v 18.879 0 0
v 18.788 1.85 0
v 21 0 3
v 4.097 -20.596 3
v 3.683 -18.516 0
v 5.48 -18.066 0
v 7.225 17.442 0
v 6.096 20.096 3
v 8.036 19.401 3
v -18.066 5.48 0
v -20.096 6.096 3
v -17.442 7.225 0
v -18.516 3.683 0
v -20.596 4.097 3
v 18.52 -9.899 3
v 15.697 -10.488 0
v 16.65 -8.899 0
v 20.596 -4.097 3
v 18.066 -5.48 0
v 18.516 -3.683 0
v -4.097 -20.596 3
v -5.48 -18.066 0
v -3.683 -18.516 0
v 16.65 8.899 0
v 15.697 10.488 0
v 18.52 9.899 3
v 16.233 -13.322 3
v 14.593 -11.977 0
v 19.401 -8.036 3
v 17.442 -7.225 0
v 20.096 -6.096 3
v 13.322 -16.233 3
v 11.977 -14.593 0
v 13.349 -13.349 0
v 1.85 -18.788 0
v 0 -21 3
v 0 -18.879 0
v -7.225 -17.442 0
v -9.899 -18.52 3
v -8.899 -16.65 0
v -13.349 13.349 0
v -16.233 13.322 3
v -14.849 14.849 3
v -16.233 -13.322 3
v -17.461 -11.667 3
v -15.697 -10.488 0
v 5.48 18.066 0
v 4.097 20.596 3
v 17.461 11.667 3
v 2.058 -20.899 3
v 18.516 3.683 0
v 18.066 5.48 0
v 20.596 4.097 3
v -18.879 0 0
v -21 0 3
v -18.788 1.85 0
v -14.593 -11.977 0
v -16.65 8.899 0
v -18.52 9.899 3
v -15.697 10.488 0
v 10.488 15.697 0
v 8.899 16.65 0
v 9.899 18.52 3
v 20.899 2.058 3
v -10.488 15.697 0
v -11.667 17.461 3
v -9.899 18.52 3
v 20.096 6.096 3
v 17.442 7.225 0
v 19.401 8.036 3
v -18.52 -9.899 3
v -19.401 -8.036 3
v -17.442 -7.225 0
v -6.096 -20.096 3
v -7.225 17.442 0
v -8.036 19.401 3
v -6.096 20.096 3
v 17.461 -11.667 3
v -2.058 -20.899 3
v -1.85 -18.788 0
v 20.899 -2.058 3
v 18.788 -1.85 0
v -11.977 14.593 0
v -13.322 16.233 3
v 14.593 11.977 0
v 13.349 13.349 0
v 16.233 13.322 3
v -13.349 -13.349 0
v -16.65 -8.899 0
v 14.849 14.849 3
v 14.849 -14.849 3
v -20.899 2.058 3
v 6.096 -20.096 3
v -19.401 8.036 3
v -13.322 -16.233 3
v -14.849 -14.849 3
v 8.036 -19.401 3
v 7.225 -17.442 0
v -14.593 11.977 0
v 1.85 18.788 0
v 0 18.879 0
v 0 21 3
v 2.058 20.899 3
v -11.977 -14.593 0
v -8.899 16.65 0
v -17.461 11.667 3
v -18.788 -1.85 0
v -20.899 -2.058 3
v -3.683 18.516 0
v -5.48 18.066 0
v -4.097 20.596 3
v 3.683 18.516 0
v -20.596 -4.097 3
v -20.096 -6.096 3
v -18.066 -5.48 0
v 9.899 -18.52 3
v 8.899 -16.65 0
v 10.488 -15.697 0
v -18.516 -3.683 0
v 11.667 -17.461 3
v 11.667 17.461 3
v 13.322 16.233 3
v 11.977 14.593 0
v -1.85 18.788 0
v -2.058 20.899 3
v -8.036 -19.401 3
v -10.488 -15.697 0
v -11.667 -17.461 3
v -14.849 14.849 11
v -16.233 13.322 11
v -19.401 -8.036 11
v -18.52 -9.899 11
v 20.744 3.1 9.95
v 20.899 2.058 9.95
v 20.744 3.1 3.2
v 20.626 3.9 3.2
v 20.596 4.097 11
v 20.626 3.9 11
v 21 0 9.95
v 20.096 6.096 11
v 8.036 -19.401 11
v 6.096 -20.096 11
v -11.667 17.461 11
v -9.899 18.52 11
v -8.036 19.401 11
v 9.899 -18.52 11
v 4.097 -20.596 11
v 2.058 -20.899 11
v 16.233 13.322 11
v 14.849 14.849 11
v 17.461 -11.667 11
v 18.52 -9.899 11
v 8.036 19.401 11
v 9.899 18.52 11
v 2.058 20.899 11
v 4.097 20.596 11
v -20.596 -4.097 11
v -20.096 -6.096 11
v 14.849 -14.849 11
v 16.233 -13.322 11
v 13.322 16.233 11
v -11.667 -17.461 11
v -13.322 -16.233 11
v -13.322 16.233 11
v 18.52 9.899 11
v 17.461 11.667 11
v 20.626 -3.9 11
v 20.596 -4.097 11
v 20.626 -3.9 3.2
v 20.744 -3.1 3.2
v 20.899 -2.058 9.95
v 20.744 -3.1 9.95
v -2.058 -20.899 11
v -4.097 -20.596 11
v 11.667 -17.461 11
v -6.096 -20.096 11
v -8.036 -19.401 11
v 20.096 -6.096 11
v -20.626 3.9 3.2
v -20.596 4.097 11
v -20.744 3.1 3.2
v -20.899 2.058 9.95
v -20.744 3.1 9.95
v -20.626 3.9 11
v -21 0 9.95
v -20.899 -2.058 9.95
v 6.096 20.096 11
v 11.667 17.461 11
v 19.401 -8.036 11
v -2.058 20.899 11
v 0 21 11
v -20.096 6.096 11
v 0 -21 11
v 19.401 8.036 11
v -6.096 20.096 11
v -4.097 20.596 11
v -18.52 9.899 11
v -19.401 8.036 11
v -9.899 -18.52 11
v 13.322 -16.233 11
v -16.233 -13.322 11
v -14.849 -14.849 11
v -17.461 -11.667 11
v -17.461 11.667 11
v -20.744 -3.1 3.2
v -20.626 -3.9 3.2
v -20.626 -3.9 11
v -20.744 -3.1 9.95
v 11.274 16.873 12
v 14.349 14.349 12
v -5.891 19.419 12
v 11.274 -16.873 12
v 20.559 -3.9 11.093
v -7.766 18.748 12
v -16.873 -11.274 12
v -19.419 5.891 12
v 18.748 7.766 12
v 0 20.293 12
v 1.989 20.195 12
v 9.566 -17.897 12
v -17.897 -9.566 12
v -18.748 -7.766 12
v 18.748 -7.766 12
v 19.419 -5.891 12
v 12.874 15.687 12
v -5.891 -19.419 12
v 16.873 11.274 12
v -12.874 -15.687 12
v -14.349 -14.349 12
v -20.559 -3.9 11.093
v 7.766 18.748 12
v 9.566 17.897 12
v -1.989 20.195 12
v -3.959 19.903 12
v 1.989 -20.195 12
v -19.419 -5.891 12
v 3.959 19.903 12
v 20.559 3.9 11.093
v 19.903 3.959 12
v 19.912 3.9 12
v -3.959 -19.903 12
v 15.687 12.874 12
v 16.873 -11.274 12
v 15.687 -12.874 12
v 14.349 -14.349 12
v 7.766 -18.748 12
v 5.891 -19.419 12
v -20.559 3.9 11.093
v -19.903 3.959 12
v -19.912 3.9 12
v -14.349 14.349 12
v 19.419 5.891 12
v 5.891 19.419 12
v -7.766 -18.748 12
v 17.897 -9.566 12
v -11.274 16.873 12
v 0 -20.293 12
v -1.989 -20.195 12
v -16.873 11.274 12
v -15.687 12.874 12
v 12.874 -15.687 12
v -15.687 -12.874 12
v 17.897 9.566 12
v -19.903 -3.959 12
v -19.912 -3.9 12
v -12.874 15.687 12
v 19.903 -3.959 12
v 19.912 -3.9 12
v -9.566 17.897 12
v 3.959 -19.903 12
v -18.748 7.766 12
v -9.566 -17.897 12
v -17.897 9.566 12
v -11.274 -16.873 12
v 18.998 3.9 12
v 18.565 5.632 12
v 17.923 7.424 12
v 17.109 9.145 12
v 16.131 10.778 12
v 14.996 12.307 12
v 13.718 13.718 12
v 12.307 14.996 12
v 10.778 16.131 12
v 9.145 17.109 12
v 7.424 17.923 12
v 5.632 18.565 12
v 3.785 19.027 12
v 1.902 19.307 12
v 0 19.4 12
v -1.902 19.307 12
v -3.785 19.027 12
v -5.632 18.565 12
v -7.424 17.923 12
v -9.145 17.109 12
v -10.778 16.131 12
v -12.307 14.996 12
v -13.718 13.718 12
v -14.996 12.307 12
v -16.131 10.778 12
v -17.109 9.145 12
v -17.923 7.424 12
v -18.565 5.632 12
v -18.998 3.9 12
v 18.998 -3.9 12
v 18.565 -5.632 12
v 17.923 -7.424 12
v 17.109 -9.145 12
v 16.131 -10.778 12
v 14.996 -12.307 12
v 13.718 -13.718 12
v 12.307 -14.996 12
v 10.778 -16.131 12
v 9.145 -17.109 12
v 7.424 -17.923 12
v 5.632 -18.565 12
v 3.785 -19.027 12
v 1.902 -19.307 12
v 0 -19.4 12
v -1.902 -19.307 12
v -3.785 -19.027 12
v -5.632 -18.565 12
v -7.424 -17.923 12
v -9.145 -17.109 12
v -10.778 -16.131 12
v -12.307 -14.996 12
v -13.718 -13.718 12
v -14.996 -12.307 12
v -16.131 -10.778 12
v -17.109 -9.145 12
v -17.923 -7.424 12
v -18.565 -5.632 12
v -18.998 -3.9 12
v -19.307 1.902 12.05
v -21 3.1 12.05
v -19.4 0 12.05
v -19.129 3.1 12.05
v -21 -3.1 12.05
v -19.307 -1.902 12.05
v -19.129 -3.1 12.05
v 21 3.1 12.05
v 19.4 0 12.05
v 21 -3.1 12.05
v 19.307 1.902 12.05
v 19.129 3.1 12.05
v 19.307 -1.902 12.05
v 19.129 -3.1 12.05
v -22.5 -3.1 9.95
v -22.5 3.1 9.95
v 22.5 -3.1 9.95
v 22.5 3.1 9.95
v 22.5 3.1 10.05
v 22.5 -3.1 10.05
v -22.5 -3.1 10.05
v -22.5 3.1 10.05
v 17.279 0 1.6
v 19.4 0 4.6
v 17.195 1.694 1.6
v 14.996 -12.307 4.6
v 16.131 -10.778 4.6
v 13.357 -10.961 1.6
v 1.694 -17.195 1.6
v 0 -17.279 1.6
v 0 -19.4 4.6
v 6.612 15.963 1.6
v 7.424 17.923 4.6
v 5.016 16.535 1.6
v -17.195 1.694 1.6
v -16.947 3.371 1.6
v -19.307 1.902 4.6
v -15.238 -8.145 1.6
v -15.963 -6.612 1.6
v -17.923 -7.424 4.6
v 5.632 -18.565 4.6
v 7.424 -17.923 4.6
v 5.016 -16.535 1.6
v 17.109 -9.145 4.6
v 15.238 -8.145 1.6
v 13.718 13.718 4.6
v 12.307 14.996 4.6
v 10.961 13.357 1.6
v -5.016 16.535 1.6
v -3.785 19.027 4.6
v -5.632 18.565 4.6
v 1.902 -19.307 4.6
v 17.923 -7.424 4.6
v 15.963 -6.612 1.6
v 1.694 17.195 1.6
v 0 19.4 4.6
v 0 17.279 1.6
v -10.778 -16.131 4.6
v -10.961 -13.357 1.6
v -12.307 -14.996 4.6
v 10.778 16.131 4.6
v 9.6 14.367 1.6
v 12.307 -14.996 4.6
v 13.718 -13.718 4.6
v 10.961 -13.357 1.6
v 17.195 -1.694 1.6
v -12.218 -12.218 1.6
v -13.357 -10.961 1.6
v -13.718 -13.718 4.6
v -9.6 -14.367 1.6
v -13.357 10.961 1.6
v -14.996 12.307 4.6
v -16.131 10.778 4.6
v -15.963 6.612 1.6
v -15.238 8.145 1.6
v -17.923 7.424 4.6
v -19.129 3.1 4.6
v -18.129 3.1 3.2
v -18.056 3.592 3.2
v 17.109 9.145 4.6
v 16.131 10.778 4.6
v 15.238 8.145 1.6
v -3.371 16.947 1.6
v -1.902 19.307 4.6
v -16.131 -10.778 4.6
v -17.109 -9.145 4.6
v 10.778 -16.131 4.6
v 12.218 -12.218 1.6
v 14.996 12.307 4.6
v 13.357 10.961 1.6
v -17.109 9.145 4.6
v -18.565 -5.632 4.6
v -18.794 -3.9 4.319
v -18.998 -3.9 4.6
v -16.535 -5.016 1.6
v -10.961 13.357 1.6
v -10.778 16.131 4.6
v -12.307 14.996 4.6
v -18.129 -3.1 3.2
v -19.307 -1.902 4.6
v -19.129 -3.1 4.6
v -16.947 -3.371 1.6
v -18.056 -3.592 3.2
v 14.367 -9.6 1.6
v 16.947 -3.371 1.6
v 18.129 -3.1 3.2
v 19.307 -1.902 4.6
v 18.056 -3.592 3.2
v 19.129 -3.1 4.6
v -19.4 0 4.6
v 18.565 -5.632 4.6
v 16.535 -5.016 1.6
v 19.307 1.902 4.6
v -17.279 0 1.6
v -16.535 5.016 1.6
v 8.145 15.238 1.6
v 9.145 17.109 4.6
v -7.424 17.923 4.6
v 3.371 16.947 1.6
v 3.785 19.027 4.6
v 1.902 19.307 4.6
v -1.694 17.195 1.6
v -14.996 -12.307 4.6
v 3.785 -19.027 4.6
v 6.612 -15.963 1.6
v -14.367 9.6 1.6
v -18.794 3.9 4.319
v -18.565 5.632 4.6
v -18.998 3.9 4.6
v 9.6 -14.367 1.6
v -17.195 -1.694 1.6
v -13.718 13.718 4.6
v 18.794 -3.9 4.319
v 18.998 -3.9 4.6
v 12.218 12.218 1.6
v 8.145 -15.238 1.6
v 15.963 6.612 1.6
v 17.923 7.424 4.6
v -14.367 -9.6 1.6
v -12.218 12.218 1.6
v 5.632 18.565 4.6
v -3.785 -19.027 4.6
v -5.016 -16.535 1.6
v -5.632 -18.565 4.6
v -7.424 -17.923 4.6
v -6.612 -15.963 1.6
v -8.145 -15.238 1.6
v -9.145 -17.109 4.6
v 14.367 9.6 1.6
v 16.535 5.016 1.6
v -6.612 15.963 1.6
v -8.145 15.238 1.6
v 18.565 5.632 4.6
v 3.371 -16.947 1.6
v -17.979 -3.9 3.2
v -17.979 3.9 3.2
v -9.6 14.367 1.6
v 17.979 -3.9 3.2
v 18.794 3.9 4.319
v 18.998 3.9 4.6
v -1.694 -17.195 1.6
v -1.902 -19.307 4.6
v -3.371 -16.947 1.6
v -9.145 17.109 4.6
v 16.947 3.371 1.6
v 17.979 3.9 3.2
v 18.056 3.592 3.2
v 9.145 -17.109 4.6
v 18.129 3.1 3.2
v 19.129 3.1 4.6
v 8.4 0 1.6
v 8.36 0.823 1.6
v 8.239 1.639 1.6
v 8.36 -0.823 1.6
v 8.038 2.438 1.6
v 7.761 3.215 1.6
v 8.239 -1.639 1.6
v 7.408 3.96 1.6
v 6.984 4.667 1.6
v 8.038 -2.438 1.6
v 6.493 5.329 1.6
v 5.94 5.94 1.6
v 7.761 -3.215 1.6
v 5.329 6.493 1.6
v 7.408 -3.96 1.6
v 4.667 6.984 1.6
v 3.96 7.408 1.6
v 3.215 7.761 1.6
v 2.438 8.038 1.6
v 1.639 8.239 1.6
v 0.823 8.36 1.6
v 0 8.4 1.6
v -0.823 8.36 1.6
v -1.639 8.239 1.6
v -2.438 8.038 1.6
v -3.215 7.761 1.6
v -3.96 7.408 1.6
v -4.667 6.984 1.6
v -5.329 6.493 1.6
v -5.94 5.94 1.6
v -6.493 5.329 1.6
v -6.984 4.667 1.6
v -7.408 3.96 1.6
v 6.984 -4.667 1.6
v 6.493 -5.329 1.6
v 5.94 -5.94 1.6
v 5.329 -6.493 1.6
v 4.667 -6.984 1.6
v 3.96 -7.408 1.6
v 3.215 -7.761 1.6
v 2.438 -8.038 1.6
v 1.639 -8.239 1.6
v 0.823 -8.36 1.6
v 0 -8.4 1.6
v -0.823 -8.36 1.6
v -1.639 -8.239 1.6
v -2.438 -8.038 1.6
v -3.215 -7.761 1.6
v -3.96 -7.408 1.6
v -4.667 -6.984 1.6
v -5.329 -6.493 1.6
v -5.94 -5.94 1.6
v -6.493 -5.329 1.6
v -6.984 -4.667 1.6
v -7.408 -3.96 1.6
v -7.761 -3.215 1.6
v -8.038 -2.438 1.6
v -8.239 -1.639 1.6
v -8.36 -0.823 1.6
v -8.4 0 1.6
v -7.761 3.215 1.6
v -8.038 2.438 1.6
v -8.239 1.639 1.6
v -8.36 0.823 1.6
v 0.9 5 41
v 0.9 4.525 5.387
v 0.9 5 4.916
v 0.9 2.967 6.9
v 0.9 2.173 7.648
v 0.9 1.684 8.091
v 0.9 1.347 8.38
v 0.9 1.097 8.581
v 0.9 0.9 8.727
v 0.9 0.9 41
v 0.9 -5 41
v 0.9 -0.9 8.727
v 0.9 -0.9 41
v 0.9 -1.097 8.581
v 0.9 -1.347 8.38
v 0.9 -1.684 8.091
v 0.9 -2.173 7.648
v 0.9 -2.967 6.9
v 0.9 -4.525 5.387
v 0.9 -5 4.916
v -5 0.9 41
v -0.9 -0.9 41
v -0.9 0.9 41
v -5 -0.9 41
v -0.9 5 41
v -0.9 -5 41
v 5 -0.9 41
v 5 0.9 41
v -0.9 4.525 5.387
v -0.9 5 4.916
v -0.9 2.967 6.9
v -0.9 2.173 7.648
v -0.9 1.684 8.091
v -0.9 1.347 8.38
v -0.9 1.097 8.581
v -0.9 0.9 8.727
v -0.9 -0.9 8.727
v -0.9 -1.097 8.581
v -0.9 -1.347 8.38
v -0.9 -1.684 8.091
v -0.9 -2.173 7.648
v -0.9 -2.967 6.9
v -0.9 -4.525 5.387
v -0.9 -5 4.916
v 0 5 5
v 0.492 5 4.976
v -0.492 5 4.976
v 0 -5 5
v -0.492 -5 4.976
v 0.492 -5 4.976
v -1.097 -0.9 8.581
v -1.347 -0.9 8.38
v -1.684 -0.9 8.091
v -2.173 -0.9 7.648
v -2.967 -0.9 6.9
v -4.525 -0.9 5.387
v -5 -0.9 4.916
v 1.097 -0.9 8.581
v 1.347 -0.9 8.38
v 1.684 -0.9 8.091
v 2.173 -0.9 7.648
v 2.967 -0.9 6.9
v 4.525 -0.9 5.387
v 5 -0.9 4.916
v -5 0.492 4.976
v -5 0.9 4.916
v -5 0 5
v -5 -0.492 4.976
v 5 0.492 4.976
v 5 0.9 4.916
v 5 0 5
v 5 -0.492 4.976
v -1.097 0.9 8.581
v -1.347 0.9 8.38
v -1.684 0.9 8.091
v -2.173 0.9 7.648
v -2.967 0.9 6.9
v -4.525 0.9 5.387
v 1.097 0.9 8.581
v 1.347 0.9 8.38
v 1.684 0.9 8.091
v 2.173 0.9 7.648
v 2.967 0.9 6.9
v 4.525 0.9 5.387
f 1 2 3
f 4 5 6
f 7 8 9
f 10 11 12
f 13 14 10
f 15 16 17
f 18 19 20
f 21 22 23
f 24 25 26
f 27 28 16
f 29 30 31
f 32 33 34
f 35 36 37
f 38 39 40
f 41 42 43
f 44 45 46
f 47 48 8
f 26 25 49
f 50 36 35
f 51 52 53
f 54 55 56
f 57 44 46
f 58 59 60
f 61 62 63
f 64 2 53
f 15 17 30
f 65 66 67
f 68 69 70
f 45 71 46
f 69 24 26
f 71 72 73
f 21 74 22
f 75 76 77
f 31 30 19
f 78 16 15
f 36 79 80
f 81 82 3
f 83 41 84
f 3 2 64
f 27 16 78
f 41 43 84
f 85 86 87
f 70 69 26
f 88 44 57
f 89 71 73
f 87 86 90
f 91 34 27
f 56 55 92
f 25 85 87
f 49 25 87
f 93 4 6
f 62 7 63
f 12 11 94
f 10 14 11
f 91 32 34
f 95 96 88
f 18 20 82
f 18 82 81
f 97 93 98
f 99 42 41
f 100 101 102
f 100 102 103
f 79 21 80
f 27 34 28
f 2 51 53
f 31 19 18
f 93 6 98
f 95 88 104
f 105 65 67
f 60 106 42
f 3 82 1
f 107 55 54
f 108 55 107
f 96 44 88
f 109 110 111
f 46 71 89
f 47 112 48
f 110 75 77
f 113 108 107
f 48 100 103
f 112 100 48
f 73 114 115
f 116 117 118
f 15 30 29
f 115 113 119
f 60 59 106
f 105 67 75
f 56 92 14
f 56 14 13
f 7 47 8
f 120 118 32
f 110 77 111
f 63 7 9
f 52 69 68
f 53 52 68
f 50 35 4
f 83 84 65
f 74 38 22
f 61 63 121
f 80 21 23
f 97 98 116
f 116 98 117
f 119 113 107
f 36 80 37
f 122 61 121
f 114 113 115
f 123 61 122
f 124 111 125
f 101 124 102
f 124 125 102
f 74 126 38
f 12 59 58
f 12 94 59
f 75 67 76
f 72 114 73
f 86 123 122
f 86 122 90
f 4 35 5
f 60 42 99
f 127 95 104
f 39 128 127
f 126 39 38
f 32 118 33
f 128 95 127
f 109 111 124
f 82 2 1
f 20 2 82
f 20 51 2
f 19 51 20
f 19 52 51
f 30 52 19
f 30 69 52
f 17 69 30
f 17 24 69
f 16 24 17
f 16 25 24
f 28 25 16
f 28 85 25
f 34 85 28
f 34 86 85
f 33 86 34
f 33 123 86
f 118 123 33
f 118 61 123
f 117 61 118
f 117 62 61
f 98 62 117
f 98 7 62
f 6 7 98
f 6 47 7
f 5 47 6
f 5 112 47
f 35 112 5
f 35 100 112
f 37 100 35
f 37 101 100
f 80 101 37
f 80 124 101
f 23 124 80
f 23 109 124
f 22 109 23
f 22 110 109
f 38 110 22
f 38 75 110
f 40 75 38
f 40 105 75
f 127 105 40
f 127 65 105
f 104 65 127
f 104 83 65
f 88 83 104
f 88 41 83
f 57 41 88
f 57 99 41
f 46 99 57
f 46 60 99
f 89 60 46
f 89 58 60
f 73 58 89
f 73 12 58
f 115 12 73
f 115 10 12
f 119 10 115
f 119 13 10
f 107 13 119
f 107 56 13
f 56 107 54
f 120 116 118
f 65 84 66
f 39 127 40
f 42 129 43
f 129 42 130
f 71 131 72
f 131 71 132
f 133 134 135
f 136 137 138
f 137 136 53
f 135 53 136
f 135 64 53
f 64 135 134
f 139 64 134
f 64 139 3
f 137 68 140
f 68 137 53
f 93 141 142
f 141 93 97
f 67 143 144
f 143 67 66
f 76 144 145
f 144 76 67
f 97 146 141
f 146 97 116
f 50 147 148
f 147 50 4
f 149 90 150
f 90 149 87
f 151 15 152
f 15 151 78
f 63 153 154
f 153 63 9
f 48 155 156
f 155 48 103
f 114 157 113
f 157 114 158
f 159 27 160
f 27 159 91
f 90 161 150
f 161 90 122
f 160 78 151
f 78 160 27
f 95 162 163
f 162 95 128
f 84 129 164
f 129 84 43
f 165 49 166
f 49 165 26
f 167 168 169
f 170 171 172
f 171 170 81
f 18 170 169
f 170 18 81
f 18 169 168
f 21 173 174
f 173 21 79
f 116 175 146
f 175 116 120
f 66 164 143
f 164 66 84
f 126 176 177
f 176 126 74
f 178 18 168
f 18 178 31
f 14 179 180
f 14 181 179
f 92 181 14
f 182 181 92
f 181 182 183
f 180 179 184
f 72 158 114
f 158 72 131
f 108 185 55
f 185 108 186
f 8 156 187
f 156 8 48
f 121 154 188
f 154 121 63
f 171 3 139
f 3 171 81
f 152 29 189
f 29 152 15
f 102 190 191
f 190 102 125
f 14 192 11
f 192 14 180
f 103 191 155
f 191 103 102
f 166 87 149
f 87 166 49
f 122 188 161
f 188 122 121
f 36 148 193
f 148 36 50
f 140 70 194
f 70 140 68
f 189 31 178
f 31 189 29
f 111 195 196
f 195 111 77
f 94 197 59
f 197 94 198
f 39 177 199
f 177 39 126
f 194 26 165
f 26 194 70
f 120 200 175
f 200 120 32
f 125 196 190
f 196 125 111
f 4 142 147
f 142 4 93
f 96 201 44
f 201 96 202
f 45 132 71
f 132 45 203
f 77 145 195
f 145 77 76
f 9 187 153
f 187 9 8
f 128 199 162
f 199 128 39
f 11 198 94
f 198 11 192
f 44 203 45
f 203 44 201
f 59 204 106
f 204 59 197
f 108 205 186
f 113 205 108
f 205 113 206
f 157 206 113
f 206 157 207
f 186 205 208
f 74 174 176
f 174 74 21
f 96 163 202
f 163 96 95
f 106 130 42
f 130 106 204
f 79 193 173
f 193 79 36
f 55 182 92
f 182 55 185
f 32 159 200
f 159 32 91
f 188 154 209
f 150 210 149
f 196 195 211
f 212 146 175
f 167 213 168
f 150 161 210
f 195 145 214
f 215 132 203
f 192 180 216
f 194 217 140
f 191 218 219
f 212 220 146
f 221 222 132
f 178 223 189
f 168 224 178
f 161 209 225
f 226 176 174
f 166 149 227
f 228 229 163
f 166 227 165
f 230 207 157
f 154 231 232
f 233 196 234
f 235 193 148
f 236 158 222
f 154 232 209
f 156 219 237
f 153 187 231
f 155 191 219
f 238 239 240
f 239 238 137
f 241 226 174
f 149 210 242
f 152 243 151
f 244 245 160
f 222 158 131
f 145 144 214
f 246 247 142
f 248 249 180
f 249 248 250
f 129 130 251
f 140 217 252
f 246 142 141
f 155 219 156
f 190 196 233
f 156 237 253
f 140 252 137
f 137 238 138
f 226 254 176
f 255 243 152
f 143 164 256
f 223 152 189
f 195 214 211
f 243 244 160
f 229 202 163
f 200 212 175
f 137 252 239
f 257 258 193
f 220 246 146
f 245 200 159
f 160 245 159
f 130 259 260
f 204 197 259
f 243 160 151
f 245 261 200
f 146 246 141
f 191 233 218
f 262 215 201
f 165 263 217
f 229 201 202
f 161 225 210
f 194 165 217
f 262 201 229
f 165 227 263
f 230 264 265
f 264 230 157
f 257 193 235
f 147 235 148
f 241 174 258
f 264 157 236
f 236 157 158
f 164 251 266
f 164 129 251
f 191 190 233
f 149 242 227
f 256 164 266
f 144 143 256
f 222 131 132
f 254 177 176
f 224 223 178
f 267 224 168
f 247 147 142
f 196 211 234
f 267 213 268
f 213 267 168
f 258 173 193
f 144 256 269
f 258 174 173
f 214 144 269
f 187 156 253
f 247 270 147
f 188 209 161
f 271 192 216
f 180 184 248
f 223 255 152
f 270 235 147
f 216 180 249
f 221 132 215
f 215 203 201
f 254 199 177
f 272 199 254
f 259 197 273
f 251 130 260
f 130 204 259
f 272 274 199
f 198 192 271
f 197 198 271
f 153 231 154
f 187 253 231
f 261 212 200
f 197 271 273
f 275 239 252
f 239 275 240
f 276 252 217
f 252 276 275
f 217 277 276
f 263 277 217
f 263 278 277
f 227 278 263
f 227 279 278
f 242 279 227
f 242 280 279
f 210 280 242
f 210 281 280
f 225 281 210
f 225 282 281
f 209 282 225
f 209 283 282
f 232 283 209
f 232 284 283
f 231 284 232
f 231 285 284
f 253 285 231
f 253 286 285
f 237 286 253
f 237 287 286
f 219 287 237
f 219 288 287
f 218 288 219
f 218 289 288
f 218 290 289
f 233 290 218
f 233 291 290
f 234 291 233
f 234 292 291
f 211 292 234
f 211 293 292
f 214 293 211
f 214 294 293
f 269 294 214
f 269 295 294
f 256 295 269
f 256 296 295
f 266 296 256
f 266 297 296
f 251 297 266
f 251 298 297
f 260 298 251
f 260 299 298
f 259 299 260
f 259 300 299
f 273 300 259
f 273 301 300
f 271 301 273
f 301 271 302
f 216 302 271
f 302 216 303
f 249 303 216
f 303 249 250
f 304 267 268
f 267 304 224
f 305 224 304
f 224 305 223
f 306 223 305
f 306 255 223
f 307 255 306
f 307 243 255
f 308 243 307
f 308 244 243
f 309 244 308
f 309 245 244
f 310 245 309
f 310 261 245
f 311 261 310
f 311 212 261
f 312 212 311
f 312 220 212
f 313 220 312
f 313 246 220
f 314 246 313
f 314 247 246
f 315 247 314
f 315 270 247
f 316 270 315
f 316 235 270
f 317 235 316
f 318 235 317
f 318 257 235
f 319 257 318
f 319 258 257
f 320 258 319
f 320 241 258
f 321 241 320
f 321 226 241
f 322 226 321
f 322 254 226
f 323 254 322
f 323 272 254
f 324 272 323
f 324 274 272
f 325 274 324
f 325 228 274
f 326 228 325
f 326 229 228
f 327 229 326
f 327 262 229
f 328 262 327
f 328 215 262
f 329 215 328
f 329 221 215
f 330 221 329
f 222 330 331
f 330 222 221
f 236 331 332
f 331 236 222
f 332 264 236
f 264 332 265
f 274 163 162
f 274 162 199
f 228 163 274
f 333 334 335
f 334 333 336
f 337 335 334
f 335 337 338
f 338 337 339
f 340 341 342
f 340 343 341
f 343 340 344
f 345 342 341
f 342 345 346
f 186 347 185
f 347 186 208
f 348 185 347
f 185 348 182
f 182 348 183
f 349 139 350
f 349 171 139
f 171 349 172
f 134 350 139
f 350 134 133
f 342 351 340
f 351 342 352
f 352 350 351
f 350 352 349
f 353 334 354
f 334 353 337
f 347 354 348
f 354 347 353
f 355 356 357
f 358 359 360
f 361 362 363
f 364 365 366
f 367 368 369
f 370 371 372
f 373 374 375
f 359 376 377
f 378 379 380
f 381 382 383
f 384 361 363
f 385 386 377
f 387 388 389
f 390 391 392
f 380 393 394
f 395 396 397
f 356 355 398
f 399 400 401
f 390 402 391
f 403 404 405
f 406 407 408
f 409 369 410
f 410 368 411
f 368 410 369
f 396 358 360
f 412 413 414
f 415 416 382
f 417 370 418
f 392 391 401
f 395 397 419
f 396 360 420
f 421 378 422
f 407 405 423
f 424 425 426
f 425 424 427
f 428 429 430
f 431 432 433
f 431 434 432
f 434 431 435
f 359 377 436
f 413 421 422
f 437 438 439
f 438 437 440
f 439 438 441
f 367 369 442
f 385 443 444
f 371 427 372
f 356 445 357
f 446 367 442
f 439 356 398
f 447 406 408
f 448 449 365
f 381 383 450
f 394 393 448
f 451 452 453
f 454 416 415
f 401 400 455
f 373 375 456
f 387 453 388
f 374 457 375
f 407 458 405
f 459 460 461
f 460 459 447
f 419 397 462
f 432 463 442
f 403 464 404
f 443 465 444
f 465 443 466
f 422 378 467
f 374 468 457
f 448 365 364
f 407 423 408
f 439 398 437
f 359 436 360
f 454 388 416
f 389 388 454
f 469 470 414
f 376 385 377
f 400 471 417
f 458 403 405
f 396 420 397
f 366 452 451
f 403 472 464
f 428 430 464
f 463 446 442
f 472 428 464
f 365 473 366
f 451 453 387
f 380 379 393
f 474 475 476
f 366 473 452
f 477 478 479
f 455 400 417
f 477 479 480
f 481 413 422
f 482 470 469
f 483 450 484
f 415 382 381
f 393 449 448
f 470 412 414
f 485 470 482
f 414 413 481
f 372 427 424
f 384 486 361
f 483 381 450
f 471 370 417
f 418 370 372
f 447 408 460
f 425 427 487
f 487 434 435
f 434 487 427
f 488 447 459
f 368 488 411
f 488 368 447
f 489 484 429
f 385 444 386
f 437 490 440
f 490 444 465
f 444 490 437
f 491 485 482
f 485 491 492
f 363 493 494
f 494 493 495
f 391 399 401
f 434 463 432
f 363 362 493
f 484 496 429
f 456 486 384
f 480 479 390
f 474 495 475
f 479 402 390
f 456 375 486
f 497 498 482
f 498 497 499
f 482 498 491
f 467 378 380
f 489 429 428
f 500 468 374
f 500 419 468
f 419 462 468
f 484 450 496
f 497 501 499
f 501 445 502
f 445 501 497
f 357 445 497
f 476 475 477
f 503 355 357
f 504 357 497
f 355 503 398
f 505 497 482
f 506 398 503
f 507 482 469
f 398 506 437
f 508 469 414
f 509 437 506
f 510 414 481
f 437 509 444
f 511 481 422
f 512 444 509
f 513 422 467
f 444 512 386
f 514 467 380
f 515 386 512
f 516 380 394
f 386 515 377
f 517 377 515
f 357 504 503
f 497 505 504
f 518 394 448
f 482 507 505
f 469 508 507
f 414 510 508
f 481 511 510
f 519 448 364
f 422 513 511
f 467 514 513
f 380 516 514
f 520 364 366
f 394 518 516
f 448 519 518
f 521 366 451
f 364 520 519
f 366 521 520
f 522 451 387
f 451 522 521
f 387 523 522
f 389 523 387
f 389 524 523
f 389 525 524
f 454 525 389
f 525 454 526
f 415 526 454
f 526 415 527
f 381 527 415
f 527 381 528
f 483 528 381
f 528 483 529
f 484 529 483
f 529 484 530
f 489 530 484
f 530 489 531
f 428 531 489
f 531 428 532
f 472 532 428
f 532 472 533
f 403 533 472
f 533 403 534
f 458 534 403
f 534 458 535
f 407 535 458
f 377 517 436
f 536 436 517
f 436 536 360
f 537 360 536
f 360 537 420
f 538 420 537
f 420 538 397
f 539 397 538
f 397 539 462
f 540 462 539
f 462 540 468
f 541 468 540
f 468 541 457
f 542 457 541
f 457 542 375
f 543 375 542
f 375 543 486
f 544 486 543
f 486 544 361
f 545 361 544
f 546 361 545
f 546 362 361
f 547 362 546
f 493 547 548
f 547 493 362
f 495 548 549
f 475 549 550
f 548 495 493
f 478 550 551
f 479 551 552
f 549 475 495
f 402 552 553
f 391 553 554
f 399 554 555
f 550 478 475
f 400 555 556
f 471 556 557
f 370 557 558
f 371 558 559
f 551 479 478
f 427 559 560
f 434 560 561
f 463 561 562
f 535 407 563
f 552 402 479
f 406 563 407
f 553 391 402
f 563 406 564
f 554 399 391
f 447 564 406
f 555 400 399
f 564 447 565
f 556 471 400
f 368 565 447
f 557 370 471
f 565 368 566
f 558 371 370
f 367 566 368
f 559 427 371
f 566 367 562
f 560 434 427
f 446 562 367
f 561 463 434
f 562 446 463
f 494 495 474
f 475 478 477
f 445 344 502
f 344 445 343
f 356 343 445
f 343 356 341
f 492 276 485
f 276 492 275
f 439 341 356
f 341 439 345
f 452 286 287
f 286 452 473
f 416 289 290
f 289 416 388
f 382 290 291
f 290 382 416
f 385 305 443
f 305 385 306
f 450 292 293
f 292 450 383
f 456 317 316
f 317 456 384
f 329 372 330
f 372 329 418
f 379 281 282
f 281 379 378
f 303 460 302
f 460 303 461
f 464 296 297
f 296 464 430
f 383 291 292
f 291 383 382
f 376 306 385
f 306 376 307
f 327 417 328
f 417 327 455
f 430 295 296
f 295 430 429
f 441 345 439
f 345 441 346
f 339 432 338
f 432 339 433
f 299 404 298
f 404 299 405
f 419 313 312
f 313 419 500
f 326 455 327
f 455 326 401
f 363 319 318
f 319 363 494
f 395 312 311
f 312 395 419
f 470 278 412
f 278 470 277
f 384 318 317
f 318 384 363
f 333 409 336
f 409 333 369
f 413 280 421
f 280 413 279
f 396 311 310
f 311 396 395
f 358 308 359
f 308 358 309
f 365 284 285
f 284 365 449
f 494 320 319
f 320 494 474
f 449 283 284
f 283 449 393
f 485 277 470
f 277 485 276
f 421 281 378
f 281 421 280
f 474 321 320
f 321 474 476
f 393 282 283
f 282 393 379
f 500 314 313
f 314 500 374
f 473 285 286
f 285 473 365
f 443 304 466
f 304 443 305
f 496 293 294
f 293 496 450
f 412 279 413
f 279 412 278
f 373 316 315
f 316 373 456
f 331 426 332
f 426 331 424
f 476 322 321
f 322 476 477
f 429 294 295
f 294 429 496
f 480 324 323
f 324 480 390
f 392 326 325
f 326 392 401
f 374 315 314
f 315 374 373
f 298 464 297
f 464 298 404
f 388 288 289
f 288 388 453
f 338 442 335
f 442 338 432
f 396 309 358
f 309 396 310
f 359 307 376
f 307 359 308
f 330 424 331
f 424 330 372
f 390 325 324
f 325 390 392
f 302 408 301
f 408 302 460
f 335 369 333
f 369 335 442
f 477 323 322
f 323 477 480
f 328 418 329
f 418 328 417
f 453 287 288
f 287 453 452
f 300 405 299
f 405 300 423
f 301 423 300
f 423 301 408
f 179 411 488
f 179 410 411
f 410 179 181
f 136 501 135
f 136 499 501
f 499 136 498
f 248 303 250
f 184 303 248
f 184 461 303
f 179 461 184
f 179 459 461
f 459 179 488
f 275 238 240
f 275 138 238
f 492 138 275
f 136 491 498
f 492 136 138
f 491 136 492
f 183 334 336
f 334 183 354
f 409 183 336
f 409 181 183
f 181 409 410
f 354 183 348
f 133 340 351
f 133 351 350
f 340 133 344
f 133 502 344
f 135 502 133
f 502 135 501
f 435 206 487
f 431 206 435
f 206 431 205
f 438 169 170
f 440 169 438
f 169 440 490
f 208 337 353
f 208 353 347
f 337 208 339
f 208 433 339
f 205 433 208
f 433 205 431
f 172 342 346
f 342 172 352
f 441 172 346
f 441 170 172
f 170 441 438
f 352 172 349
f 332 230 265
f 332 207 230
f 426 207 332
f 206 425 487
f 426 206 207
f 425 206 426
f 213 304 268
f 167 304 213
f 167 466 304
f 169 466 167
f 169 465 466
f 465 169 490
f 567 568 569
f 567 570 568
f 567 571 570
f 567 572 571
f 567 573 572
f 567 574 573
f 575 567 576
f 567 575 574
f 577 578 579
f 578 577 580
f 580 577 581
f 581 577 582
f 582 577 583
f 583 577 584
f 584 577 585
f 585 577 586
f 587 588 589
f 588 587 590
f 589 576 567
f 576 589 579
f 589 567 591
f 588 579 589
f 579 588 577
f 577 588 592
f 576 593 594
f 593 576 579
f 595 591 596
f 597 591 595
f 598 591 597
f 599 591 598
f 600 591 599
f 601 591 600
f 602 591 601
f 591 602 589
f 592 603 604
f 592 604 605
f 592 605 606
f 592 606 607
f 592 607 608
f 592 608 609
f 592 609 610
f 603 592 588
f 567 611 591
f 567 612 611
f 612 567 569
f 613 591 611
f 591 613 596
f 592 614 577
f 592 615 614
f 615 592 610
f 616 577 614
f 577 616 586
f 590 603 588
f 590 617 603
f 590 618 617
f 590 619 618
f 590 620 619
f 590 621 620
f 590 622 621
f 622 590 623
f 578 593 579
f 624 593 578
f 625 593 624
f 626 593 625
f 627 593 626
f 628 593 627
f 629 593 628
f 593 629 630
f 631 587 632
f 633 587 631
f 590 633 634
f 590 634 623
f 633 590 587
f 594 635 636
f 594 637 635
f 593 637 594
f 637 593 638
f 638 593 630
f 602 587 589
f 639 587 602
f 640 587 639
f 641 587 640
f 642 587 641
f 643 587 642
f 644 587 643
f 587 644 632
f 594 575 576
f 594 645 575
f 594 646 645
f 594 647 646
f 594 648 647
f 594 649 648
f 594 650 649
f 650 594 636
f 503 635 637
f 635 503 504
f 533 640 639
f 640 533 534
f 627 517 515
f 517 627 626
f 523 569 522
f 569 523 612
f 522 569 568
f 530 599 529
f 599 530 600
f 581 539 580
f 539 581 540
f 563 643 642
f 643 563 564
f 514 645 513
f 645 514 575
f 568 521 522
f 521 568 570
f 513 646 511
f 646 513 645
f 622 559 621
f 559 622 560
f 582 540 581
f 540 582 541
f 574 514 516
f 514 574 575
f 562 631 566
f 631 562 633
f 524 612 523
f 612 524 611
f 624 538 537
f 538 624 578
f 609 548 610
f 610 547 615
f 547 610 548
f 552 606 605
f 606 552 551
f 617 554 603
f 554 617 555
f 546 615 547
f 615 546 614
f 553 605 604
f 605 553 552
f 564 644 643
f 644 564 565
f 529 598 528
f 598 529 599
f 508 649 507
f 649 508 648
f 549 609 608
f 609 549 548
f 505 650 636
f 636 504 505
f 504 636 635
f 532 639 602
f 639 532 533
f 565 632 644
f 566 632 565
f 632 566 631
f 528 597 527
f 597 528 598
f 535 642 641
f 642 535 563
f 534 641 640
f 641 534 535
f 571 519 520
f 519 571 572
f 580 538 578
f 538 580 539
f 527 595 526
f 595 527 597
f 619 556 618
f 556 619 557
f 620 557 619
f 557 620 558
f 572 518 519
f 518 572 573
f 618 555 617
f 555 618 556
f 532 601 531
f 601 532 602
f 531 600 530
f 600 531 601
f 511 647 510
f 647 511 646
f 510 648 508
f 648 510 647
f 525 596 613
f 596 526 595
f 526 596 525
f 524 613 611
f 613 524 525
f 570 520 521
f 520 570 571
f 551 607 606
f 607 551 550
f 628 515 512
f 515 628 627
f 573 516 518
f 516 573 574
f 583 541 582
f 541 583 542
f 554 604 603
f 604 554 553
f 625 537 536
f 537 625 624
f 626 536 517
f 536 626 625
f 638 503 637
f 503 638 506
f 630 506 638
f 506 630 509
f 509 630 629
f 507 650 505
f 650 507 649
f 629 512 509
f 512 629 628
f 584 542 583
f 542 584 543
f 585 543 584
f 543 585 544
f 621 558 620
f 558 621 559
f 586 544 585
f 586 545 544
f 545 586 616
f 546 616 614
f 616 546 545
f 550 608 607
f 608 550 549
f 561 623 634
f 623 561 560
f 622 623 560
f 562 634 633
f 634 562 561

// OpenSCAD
$fn=64;


module symY(t) {
    translate(t)
        children();
    mirror([0,1,0])
        translate(t)
            children();
}


module  cappedCylinder(d=1,h=1,center=true,capB=3,capT=1) {
   sq2 =sqrt(2);
    translate([0,0,-h/2])
    {
        cylinder(d1=d-capB*sq2,d2=d,h=capB);
        translate([0,0,capB])
        cylinder(d=d,h=h-capB-capT);

        translate([0,0,h-capT])
        cylinder(d2=d-capT*sq2,d1=d,h=capT);
//    cylinder(d=d,h=h-cap,center=center);
    }
    
//    cylinder(d=d,h=h,center=center);
}

module cross() {
    W=1.8;
    DIA=10;
    H=41;
    cylinder(d1=DIA*2,d2=0,h=DIA);
    translate([0,0,H/2]) {
        cube([W,DIA,H],center=true);
        rotate(90)
        cube([W,DIA,H],center=true);
    }
}

D=42;
W=1.6;
P=12;
CLAMP_D=7;
CLAMP_G=2;
CLAMP_GE=1;

translate([0,0,P/2])
difference() {
    union() {
        cappedCylinder(d=D,h=P,center=true);
        translate([0,0,P/2])
        hull() {
        translate([0,0,0-CLAMP_G])
            cube([D+CLAMP_G+CLAMP_GE,CLAMP_D,.1],center=true);
            cube([D,CLAMP_D,.1],center=true);
        }
    }
    translate([0,0,W])
    cappedCylinder(d=D-2*W,h=P,center=true);
    symY([0,CLAMP_D/2,W+W])
    cube([100,W/2,P],center=true);
    
}


cross();
